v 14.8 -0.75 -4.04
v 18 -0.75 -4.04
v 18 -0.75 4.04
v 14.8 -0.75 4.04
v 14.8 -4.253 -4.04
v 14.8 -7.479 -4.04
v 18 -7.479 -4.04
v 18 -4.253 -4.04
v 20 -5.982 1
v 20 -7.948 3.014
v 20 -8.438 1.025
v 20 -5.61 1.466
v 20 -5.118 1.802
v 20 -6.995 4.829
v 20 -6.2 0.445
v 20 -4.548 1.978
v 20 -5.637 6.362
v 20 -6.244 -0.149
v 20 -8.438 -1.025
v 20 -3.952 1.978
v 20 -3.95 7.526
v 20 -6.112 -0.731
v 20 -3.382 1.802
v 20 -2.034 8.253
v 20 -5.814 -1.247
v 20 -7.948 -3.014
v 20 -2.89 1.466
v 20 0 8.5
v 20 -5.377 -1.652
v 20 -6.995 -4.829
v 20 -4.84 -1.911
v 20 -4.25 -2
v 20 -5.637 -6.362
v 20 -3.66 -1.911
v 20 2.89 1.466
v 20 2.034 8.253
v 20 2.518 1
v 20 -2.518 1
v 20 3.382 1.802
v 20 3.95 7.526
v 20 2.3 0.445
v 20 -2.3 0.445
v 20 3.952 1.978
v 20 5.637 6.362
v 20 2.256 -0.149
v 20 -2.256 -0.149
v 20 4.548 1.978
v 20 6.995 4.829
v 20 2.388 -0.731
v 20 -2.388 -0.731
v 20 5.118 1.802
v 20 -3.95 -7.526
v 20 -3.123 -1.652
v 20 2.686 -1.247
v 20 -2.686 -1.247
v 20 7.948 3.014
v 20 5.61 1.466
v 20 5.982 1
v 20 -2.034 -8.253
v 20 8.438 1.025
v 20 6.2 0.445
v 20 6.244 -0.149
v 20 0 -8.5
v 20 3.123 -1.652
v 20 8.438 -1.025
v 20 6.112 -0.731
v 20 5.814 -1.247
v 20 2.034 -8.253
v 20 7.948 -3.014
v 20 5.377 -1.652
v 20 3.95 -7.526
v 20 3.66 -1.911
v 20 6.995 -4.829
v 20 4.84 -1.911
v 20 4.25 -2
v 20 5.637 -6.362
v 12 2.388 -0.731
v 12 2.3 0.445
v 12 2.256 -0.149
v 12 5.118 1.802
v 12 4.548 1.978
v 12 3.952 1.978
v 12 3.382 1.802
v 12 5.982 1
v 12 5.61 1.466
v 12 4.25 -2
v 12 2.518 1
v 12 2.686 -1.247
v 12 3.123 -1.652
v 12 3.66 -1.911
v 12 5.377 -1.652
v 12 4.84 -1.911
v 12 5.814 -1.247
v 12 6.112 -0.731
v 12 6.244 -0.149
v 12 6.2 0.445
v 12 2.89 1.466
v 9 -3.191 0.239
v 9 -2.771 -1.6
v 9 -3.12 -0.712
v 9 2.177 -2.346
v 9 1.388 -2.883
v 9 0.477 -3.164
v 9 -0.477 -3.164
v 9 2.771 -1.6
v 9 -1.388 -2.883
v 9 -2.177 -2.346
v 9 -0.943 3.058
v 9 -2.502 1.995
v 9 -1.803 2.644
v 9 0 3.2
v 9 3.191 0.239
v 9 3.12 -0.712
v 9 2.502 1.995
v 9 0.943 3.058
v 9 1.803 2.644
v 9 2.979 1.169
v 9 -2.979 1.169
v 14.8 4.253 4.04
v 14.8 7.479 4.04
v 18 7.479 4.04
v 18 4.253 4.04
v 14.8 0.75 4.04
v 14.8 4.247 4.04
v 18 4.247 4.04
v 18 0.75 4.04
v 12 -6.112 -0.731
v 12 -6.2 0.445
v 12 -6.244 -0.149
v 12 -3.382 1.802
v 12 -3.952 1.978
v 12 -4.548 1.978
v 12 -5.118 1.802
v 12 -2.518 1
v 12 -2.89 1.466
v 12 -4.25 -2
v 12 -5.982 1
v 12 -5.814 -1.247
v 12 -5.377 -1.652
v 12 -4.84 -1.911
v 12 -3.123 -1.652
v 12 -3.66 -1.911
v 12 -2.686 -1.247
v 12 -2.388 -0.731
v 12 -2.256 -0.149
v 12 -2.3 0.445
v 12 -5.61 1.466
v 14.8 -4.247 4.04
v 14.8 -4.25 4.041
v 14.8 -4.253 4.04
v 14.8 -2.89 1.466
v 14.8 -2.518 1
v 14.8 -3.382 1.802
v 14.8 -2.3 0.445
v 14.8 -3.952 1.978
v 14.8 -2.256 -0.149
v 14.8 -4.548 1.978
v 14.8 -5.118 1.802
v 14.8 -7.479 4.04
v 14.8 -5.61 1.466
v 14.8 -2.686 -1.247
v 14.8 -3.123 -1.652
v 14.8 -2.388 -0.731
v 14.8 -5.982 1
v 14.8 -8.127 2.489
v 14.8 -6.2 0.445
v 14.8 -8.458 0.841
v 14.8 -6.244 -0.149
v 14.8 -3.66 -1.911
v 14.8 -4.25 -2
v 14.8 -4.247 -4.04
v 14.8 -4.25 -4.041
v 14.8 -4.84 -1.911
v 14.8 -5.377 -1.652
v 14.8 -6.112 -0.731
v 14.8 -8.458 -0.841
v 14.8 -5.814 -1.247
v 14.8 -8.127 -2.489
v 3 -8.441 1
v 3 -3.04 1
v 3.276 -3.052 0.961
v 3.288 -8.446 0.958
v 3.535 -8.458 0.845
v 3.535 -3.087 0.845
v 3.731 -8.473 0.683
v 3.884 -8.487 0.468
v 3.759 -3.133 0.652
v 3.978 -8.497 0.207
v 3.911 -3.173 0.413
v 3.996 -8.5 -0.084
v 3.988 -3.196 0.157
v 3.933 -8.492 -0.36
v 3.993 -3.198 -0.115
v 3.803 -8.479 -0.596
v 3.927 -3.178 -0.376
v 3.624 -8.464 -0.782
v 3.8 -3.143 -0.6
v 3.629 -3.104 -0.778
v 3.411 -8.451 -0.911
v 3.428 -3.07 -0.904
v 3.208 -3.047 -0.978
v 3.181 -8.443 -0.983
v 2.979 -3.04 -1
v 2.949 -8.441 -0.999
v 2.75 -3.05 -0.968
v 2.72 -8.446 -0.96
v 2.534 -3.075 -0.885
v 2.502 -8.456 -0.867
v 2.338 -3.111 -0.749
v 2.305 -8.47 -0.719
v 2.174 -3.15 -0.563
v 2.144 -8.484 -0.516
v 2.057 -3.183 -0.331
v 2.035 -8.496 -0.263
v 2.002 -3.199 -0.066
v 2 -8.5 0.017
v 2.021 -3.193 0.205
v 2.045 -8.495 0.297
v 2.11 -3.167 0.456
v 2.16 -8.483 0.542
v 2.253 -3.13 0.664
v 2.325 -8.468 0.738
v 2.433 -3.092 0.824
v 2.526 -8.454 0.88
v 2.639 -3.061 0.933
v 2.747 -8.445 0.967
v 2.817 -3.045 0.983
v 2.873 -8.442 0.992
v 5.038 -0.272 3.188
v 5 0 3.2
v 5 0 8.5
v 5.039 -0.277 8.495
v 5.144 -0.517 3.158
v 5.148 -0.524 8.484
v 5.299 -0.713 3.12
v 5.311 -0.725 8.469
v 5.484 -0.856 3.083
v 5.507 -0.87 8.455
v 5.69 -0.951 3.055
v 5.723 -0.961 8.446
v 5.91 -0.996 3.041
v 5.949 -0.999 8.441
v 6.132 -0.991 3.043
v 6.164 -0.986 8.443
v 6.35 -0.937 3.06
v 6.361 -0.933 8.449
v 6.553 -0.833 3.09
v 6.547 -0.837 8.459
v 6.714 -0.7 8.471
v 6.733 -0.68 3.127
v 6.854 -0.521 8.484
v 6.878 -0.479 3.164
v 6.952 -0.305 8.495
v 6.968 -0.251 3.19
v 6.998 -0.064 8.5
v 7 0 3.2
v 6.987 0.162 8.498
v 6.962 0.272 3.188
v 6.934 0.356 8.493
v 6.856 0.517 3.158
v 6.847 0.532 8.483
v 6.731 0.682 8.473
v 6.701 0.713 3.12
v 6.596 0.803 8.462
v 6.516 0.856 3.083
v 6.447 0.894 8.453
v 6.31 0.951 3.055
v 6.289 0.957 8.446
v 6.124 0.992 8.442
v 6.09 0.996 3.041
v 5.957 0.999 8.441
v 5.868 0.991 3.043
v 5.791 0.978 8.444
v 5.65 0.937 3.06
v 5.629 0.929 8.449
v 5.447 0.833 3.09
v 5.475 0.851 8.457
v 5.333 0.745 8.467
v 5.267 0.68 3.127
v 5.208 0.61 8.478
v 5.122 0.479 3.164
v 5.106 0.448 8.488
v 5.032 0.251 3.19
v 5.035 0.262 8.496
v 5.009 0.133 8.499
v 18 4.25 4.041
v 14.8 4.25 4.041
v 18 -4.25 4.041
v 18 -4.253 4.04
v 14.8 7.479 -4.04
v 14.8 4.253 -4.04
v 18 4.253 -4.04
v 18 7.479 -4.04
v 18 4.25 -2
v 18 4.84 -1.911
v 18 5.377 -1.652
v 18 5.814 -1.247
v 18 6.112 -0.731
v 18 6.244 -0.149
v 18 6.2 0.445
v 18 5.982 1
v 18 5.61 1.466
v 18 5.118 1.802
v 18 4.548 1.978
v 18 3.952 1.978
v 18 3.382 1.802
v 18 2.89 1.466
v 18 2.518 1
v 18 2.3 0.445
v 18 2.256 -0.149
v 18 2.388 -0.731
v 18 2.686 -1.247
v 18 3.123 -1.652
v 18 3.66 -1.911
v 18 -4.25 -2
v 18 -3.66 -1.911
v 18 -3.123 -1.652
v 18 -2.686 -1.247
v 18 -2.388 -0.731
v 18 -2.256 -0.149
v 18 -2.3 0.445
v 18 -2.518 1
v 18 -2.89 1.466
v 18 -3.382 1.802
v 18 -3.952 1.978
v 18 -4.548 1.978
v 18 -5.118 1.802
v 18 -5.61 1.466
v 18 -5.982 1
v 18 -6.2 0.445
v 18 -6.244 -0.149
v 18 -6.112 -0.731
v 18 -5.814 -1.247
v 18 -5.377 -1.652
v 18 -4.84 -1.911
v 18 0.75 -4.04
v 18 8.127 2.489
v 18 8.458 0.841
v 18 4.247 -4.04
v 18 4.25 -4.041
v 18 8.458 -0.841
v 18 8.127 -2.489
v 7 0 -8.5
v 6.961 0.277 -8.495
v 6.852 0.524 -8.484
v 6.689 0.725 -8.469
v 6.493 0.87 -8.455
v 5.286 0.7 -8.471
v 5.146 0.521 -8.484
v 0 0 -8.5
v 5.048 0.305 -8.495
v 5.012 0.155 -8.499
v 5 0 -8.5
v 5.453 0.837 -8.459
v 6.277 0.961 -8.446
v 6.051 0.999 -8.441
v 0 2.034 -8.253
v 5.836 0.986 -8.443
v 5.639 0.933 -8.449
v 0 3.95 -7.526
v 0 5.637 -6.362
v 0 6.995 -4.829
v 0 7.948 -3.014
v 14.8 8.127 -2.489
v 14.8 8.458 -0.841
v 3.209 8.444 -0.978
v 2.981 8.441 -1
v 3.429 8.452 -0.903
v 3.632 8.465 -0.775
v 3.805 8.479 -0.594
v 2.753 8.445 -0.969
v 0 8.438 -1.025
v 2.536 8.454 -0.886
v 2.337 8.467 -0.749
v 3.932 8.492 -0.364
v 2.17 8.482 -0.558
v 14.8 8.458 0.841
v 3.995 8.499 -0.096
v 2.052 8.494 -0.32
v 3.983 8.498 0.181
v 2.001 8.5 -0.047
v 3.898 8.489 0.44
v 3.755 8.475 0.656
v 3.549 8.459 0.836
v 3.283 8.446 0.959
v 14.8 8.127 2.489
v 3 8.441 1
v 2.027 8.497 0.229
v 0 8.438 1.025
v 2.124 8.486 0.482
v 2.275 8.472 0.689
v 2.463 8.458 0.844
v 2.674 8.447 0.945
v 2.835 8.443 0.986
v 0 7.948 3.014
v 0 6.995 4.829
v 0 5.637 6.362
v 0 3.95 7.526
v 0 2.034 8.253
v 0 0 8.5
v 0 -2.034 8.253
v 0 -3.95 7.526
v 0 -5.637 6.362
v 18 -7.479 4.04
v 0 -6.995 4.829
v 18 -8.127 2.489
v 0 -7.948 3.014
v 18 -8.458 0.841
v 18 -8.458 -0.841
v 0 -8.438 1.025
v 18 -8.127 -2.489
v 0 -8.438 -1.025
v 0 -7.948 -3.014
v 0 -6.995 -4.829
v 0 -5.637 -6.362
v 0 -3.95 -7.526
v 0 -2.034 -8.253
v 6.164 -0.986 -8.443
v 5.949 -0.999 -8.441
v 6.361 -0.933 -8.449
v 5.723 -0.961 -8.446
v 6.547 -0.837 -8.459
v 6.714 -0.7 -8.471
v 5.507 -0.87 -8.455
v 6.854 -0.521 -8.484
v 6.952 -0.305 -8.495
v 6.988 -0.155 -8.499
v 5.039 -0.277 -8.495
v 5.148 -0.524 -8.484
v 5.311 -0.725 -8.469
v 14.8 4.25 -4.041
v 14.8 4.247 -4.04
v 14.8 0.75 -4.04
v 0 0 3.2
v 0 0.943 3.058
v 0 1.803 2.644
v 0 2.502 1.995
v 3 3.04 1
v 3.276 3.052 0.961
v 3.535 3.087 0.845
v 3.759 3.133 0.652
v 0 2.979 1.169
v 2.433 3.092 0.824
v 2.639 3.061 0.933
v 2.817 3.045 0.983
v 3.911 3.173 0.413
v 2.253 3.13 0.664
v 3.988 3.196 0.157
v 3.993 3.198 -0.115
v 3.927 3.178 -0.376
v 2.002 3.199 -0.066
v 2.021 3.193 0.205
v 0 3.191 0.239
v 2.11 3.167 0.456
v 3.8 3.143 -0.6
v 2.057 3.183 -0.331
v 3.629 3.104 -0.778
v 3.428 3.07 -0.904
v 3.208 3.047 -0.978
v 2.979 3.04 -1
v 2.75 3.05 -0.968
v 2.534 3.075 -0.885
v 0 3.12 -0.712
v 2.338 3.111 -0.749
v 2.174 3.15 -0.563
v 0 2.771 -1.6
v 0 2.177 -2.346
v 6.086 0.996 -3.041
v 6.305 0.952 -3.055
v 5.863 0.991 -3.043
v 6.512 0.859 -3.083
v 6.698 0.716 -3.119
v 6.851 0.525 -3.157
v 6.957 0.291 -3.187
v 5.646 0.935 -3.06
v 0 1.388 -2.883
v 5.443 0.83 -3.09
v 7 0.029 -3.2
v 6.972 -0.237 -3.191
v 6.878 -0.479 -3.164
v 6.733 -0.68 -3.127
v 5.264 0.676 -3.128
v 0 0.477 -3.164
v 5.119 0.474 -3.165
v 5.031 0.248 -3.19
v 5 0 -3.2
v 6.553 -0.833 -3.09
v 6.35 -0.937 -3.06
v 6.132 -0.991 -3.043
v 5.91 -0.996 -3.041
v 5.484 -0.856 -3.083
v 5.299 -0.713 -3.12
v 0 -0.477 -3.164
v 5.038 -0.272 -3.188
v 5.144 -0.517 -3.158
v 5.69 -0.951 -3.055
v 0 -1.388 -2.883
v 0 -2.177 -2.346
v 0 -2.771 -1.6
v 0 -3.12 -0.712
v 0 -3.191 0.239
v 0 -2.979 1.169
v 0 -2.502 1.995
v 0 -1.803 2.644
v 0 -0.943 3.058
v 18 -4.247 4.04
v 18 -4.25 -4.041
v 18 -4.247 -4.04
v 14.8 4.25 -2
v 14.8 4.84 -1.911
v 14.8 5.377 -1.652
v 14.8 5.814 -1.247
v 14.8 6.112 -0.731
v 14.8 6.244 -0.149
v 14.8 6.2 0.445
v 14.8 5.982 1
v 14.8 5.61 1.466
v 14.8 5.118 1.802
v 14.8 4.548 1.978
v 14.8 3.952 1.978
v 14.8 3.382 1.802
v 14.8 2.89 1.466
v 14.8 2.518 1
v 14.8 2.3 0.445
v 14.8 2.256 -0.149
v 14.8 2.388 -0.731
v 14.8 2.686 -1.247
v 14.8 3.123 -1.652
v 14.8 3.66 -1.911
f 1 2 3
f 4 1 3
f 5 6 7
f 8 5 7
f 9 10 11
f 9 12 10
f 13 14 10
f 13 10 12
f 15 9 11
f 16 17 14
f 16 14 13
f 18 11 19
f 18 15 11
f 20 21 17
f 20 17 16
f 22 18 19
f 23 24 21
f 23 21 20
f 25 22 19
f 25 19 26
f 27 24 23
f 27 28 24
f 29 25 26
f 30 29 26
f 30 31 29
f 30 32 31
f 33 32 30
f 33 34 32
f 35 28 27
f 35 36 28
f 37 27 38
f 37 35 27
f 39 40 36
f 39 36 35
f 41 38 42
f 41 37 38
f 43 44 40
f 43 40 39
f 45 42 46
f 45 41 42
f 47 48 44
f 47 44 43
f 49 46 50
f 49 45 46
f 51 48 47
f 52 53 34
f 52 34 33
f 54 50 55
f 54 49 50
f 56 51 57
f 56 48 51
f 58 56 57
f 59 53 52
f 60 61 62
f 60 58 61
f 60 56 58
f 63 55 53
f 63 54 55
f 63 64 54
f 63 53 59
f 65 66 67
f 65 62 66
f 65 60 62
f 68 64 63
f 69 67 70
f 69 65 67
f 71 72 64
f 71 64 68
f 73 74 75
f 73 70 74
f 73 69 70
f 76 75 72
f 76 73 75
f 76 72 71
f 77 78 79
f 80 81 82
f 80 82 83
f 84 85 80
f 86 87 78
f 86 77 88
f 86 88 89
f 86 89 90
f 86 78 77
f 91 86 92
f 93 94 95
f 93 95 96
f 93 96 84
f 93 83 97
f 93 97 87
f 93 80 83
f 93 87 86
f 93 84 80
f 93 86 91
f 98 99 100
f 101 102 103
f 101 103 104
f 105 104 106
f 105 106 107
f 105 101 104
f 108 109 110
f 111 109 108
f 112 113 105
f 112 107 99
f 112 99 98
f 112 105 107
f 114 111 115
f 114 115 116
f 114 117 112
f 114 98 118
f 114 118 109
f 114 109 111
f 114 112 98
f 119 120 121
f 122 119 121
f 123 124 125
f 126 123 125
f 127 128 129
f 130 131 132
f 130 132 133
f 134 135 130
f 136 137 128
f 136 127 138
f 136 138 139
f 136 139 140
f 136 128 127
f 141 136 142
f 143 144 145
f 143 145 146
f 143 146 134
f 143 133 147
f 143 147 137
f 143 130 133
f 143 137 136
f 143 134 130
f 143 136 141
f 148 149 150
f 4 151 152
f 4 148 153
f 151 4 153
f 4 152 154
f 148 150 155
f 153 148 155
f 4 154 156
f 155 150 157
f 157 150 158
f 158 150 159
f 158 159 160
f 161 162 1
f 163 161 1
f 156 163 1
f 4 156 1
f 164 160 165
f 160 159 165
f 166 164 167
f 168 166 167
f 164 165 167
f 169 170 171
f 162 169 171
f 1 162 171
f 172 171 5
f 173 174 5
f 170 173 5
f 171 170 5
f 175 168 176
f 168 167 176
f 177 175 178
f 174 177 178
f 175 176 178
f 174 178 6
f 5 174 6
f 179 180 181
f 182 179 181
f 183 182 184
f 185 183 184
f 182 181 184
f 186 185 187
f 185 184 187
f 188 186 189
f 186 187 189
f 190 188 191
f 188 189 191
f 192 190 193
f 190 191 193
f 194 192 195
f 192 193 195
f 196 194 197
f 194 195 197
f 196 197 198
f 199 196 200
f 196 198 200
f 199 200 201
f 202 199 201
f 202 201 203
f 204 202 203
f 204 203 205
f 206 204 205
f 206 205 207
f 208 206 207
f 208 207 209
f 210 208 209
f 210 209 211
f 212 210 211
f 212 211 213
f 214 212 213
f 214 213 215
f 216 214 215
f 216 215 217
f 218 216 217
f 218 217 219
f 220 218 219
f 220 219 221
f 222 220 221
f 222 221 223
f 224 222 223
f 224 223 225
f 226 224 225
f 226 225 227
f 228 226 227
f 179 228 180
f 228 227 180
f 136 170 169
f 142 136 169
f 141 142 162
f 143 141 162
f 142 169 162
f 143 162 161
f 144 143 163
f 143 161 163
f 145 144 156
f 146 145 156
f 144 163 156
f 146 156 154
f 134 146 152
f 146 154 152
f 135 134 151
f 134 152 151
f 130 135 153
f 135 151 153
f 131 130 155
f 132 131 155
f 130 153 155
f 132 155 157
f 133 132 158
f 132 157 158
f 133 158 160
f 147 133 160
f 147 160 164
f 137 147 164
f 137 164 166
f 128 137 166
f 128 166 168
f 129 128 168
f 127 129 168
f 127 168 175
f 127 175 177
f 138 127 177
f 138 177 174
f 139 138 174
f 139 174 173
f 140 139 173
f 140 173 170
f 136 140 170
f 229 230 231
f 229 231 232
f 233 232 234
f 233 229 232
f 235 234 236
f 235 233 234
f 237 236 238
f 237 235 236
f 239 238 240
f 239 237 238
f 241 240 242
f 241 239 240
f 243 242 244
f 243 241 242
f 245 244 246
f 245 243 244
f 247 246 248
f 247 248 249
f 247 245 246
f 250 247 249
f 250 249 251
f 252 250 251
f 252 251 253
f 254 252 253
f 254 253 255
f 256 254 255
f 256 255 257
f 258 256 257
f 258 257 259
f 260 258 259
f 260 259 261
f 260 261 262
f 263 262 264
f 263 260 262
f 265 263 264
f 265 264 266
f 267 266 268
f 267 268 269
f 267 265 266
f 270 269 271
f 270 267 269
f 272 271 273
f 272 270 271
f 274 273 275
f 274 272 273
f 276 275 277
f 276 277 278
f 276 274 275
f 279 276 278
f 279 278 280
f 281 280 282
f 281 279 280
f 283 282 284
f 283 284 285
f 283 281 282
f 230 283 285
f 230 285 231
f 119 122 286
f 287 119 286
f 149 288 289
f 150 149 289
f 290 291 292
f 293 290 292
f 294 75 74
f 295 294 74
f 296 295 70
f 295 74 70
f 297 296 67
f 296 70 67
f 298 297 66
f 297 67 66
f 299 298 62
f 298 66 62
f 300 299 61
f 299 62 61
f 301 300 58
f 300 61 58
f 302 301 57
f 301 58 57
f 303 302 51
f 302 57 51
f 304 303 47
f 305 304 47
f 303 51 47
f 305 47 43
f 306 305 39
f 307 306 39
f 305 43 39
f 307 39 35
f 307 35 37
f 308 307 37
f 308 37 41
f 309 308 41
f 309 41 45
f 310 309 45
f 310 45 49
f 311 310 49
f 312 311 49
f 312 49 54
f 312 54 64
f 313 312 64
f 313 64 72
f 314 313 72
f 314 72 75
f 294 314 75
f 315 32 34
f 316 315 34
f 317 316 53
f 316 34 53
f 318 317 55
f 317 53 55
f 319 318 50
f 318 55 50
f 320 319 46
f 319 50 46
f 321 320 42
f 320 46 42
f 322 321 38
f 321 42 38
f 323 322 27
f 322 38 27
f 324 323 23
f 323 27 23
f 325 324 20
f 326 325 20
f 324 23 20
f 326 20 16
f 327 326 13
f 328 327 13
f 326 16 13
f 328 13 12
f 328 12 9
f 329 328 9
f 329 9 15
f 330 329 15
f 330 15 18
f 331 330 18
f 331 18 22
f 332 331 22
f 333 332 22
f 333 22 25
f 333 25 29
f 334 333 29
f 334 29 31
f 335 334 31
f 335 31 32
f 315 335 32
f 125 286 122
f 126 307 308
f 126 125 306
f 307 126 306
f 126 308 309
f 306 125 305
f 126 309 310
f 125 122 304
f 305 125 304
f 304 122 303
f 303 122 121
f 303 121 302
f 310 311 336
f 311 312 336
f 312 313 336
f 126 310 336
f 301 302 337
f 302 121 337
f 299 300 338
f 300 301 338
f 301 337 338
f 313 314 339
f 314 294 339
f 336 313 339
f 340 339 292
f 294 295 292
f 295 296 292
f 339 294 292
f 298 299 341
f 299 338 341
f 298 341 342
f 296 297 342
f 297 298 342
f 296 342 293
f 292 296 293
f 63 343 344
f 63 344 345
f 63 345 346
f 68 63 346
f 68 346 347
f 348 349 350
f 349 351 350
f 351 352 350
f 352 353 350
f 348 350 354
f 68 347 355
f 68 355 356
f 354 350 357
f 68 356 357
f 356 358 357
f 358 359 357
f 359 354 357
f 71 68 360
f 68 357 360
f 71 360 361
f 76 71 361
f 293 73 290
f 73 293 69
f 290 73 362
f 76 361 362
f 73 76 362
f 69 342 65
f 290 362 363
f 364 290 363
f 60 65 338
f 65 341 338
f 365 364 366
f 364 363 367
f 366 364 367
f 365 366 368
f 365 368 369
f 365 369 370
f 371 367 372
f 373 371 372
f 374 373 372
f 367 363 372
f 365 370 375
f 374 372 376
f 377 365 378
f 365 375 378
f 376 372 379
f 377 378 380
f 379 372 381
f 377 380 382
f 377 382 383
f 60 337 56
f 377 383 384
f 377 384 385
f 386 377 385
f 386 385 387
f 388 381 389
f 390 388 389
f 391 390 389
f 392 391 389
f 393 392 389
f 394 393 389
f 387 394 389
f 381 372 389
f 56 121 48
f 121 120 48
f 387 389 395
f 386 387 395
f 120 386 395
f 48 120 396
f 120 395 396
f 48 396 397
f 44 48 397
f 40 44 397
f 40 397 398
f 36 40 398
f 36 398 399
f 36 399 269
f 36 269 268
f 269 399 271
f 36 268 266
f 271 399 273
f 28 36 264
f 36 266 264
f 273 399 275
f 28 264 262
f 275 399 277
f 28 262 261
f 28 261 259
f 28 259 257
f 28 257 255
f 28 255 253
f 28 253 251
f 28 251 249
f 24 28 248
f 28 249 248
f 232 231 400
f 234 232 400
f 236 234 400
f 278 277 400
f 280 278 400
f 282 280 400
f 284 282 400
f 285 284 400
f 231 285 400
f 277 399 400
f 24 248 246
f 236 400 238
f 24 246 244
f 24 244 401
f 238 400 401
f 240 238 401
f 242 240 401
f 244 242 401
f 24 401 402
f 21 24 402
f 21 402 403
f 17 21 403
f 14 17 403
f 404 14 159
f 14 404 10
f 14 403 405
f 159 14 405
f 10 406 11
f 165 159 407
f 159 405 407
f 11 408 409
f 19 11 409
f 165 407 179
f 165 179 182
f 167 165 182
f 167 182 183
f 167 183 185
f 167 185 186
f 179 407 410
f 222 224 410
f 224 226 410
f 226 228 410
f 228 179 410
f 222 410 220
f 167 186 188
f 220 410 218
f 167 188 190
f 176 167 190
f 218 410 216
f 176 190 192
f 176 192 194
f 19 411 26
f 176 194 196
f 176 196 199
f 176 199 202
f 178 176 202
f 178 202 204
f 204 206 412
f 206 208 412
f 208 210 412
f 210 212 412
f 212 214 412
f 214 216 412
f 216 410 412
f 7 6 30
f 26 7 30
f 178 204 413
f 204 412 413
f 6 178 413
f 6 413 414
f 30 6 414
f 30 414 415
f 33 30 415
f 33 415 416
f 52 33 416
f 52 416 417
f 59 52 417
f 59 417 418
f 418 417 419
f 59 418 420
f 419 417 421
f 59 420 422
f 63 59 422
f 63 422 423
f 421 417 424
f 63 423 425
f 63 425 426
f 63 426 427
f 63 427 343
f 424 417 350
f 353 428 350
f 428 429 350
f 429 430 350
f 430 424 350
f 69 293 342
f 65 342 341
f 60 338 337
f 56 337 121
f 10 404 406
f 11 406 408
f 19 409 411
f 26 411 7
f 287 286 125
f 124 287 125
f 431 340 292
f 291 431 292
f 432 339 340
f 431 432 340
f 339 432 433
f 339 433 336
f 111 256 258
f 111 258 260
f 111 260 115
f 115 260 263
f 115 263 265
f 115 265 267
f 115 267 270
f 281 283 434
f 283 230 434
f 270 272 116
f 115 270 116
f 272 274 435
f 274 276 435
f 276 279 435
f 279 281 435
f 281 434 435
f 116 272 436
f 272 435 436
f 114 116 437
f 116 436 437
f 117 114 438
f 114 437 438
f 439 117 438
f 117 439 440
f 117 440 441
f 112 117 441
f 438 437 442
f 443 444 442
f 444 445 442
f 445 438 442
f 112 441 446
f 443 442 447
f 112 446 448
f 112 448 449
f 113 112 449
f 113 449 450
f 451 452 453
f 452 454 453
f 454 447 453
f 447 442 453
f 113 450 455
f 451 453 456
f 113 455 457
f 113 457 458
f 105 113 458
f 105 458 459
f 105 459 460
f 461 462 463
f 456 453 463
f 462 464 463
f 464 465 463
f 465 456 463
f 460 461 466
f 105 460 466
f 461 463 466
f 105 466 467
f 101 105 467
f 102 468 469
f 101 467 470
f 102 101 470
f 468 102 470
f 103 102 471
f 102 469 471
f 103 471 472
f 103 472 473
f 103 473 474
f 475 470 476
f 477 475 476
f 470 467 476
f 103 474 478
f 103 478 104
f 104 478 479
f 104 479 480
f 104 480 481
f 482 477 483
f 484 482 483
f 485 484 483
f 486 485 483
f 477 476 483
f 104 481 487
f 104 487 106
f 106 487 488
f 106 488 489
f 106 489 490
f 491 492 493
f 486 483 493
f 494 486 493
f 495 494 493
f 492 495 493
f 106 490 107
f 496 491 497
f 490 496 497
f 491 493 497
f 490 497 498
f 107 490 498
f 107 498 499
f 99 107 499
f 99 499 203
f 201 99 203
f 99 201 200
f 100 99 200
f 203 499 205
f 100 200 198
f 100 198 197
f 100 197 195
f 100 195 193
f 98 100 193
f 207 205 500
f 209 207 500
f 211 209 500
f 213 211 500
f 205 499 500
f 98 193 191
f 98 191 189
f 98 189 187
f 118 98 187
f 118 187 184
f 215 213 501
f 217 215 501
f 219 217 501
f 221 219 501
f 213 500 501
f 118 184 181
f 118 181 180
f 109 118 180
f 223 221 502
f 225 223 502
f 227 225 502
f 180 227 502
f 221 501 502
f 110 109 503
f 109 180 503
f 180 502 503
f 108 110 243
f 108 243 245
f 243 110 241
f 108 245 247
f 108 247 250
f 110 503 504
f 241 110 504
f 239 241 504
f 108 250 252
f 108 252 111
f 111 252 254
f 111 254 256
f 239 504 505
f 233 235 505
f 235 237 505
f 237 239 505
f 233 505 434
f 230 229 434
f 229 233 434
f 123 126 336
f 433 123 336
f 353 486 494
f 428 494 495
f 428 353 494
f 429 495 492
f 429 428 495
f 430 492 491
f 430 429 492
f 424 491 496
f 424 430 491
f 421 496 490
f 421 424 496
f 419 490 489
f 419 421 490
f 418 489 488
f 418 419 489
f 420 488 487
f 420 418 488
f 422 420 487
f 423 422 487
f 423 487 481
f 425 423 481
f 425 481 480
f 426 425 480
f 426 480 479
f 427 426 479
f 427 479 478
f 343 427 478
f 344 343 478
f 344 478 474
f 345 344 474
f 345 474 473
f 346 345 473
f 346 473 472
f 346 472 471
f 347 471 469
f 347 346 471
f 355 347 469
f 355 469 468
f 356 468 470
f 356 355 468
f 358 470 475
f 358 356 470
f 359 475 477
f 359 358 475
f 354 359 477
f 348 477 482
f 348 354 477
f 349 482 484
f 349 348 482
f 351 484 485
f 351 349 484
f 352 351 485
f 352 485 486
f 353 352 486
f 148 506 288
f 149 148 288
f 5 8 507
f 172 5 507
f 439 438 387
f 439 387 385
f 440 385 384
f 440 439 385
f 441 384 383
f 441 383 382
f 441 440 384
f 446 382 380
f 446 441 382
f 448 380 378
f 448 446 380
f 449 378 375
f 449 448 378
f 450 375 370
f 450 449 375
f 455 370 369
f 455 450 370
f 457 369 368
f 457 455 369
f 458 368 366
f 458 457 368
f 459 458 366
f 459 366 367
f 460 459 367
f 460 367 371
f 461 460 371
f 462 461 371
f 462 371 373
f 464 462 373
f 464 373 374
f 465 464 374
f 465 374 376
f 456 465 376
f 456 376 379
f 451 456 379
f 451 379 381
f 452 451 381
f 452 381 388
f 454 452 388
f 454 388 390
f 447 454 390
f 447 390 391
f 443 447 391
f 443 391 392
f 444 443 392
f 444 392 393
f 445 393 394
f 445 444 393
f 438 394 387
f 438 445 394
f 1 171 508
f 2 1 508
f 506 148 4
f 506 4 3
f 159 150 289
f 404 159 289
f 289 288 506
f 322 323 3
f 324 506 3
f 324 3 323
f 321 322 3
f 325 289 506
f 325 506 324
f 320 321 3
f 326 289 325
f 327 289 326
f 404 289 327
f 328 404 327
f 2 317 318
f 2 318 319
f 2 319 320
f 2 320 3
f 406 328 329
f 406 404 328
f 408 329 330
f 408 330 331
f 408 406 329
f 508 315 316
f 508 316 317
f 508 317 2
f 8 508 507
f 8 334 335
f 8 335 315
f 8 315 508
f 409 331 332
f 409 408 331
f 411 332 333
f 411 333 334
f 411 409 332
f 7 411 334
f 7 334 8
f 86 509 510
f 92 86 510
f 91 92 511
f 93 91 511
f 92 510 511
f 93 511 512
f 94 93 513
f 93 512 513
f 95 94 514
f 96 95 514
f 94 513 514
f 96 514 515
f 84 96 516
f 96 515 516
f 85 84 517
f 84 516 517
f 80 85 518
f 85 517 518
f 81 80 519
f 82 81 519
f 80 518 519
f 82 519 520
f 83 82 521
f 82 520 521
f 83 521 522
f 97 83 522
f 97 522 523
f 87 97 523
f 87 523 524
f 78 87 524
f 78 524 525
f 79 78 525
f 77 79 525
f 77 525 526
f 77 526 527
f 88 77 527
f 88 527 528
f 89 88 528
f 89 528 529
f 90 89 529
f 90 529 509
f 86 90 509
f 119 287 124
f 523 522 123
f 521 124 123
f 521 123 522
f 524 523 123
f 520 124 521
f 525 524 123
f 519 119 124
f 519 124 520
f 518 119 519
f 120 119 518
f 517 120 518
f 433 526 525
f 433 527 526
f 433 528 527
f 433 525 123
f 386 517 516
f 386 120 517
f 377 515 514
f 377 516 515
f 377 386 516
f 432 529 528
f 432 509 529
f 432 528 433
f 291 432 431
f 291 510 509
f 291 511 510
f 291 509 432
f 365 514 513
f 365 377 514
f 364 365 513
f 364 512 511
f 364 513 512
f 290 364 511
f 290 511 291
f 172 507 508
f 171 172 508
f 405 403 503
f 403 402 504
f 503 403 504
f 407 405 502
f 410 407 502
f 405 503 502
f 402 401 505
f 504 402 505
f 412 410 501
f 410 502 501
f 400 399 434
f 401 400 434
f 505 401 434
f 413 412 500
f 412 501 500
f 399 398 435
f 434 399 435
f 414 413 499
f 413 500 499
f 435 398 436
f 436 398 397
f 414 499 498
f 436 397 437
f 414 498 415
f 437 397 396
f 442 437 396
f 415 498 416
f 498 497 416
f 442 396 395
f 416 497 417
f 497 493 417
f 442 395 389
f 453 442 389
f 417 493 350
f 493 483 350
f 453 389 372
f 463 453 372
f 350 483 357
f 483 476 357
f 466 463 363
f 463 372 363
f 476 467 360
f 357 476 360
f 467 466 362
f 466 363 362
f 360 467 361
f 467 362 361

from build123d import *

# Parameters (mm, degrees)
SKETCH_1_R                      = 8.5
EXTRUDE_1_DEPTH                 = 20
SKETCH_2_R                      = 3.2
CUT_EXTRUDE_1_DEPTH             = 9
CUT_EXTRUDE_2_REACH             = 25.335
SKETCH_3_R                      = 1
CUT_EXTRUDE_2_DIRECTION_2_REACH = 25.335
CUT_EXTRUDE_3_DEPTH             = 21
CUT_EXTRUDE_3_DEPTH_BACK        = 19
SKETCH_4_R                      = 1
SKETCH_5_R                      = 2
CUT_EXTRUDE_4_DEPTH             = 8
CUT_EXTRUDE_6_DEPTH             = 3.2
SKETCH_10_W                     = 3.2
SKETCH_10_H                     = 8.08
CUT_EXTRUDE_8_DEPTH             = 7.75


with BuildPart() as part:
    # 草图1 → 凸台-拉伸1 (new body)
    with BuildSketch(Plane(origin=(0, 0, 0), x_dir=(0, 0, -1), z_dir=(1, 0, 0))):
        Circle(SKETCH_1_R)
    extrude(amount=EXTRUDE_1_DEPTH)

    # 草图2 → 切除-拉伸1 (cut)
    with BuildSketch(Plane.ZY):
        Circle(SKETCH_2_R)
    extrude(amount=-CUT_EXTRUDE_1_DEPTH, mode=Mode.SUBTRACT)

    # 草图3 → 切除-拉伸2 (cut, up to next)
    with BuildSketch(Plane(origin=(0, 0, 0), x_dir=(1, 0, 0), z_dir=(0, 1, 0)), mode=Mode.PRIVATE) as cut_extrude_2_sk1:
        with Locations(Location((3, 0, 0), (0, 0, 270))):
            Circle(SKETCH_3_R)
    cut_extrude_2_tool1 = extrude(cut_extrude_2_sk1.sketch, amount=-CUT_EXTRUDE_2_REACH, mode=Mode.PRIVATE) & part.part
    add(cut_extrude_2_tool1.solids().sort_by_distance((3, 0, 0))[0], mode=Mode.SUBTRACT)

    # 草图3 → 切除-拉伸2 direction 2 (cut, up to next)
    with BuildSketch(Plane(origin=(0, 0, 0), x_dir=(1, 0, 0), z_dir=(0, 1, 0)), mode=Mode.PRIVATE) as cut_extrude_2_direction_2_sk1:
        with Locations(Location((3, 0, 0), (0, 0, 270))):
            Circle(SKETCH_3_R)
    cut_extrude_2_direction_2_tool1 = extrude(cut_extrude_2_direction_2_sk1.sketch, amount=CUT_EXTRUDE_2_DIRECTION_2_REACH, mode=Mode.PRIVATE) & part.part
    add(cut_extrude_2_direction_2_tool1.solids().sort_by_distance((3, 0, 0))[0], mode=Mode.SUBTRACT)

    # 草图4 → 切除-拉伸3 (cut, two sides: drawn at the far end of the back side and taken through both)
    with BuildSketch(Plane.XY.offset(-CUT_EXTRUDE_3_DEPTH_BACK)):
        with Locations(Location((6, 0, 0), (0, 0, 180))):
            Circle(SKETCH_4_R)
    extrude(amount=CUT_EXTRUDE_3_DEPTH + CUT_EXTRUDE_3_DEPTH_BACK, mode=Mode.SUBTRACT)

    # 草图5 → 切除-拉伸4 (cut)
    with BuildSketch(Plane(origin=(20, 0, 0), x_dir=(0, 0, -1), z_dir=(1, 0, 0))):
        with Locations((0, 4.25)):
            Circle(SKETCH_5_R)
        with Locations((0, -4.25)):
            Circle(SKETCH_5_R)
    extrude(amount=-CUT_EXTRUDE_4_DEPTH, mode=Mode.SUBTRACT)

    # 草图8 → 切除-拉伸6 (cut)
    with BuildSketch(Plane(origin=(18, 0, 0), x_dir=(0, 0, -1), z_dir=(1, 0, 0))):
        Polygon((-4.041451884, 4.25), (-2.020725942, 0.75), (2.020725942, 0.75), (4.041451884, 4.25), (2.020725942, 7.75), (-2.020725942, 7.75), align=None)
        Polygon((4.041451884, -4.25), (2.020725942, -0.75), (-2.020725942, -0.75), (-4.041451884, -4.25), (-2.020725942, -7.75), (2.020725942, -7.75), align=None)
    extrude(amount=-CUT_EXTRUDE_6_DEPTH, mode=Mode.SUBTRACT)

    # 草图10 → 切除-拉伸8 (cut)
    with BuildSketch(Plane(origin=(0, 8.5, 0), x_dir=(1, 0, 0), z_dir=(0, 1, 0))):
        with Locations((16.4, 0)):
            Rectangle(SKETCH_10_W, SKETCH_10_H)
    cut_extrude_8 = extrude(amount=-CUT_EXTRUDE_8_DEPTH, mode=Mode.SUBTRACT)

    # 镜向1: 切除-拉伸8 across plane
    add(cut_extrude_8.mirror(Plane.ZX), mode=Mode.SUBTRACT)


solid = part.part
